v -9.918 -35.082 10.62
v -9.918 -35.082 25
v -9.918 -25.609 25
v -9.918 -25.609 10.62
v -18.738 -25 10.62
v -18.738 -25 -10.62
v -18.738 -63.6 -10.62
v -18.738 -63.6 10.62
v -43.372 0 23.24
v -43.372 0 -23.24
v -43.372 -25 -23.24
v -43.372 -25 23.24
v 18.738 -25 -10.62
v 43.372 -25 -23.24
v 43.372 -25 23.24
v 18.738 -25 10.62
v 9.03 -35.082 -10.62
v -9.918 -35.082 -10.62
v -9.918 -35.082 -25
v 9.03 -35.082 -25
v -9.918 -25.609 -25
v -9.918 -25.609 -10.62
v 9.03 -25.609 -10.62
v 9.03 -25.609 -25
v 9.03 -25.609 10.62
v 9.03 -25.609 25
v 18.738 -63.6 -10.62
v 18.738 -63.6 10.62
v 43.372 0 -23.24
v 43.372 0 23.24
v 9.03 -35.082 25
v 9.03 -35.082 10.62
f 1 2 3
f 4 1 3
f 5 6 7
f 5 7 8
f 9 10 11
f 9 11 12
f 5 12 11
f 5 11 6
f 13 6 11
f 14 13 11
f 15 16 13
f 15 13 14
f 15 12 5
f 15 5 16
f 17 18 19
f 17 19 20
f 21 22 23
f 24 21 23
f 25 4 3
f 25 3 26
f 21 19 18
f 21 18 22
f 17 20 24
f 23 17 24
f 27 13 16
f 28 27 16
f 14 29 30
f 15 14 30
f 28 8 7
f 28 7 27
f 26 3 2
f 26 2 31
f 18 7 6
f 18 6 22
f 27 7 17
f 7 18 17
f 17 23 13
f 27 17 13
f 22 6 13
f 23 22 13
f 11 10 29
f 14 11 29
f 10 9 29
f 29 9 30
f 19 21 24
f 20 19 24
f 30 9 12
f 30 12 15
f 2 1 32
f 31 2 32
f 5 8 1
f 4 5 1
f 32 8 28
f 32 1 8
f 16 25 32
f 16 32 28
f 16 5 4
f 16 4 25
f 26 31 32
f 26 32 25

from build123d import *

# Parameters (mm, degrees)
F0_W     = 86.74343
F0_H     = 46.480264
F1_DEPTH = 25
F2_W     = 37.476842
F2_H     = 21.239644
F3_DEPTH = 63.6
F4_W     = 18.94737
F4_H     = 9.473686
F5_DEPTH = 25
F6_DEPTH = 25


with BuildPart() as f1:
    # F0 (on Front) → F1 (new body)
    with BuildSketch(Plane.XZ):
        Rectangle(F0_W, F0_H)
    extrude(amount=F1_DEPTH)

    # F2 (on Front) → F3 (join)
    with BuildSketch(Plane.XZ):
        Rectangle(F2_W, F2_H)
    extrude(amount=F3_DEPTH)

    # F4 (on Top) → F5 (join)
    with BuildSketch(Plane.XY):
        with Locations((-0.444079, -30.345397)):
            Rectangle(F4_W, F4_H)
    extrude(amount=-F5_DEPTH)

    # F4 (on Top) → F6 (join)
    with BuildSketch(Plane.XY):
        with Locations((-0.444079, -30.345397)):
            Rectangle(F4_W, F4_H)
    extrude(amount=F6_DEPTH)


solid = f1.part
